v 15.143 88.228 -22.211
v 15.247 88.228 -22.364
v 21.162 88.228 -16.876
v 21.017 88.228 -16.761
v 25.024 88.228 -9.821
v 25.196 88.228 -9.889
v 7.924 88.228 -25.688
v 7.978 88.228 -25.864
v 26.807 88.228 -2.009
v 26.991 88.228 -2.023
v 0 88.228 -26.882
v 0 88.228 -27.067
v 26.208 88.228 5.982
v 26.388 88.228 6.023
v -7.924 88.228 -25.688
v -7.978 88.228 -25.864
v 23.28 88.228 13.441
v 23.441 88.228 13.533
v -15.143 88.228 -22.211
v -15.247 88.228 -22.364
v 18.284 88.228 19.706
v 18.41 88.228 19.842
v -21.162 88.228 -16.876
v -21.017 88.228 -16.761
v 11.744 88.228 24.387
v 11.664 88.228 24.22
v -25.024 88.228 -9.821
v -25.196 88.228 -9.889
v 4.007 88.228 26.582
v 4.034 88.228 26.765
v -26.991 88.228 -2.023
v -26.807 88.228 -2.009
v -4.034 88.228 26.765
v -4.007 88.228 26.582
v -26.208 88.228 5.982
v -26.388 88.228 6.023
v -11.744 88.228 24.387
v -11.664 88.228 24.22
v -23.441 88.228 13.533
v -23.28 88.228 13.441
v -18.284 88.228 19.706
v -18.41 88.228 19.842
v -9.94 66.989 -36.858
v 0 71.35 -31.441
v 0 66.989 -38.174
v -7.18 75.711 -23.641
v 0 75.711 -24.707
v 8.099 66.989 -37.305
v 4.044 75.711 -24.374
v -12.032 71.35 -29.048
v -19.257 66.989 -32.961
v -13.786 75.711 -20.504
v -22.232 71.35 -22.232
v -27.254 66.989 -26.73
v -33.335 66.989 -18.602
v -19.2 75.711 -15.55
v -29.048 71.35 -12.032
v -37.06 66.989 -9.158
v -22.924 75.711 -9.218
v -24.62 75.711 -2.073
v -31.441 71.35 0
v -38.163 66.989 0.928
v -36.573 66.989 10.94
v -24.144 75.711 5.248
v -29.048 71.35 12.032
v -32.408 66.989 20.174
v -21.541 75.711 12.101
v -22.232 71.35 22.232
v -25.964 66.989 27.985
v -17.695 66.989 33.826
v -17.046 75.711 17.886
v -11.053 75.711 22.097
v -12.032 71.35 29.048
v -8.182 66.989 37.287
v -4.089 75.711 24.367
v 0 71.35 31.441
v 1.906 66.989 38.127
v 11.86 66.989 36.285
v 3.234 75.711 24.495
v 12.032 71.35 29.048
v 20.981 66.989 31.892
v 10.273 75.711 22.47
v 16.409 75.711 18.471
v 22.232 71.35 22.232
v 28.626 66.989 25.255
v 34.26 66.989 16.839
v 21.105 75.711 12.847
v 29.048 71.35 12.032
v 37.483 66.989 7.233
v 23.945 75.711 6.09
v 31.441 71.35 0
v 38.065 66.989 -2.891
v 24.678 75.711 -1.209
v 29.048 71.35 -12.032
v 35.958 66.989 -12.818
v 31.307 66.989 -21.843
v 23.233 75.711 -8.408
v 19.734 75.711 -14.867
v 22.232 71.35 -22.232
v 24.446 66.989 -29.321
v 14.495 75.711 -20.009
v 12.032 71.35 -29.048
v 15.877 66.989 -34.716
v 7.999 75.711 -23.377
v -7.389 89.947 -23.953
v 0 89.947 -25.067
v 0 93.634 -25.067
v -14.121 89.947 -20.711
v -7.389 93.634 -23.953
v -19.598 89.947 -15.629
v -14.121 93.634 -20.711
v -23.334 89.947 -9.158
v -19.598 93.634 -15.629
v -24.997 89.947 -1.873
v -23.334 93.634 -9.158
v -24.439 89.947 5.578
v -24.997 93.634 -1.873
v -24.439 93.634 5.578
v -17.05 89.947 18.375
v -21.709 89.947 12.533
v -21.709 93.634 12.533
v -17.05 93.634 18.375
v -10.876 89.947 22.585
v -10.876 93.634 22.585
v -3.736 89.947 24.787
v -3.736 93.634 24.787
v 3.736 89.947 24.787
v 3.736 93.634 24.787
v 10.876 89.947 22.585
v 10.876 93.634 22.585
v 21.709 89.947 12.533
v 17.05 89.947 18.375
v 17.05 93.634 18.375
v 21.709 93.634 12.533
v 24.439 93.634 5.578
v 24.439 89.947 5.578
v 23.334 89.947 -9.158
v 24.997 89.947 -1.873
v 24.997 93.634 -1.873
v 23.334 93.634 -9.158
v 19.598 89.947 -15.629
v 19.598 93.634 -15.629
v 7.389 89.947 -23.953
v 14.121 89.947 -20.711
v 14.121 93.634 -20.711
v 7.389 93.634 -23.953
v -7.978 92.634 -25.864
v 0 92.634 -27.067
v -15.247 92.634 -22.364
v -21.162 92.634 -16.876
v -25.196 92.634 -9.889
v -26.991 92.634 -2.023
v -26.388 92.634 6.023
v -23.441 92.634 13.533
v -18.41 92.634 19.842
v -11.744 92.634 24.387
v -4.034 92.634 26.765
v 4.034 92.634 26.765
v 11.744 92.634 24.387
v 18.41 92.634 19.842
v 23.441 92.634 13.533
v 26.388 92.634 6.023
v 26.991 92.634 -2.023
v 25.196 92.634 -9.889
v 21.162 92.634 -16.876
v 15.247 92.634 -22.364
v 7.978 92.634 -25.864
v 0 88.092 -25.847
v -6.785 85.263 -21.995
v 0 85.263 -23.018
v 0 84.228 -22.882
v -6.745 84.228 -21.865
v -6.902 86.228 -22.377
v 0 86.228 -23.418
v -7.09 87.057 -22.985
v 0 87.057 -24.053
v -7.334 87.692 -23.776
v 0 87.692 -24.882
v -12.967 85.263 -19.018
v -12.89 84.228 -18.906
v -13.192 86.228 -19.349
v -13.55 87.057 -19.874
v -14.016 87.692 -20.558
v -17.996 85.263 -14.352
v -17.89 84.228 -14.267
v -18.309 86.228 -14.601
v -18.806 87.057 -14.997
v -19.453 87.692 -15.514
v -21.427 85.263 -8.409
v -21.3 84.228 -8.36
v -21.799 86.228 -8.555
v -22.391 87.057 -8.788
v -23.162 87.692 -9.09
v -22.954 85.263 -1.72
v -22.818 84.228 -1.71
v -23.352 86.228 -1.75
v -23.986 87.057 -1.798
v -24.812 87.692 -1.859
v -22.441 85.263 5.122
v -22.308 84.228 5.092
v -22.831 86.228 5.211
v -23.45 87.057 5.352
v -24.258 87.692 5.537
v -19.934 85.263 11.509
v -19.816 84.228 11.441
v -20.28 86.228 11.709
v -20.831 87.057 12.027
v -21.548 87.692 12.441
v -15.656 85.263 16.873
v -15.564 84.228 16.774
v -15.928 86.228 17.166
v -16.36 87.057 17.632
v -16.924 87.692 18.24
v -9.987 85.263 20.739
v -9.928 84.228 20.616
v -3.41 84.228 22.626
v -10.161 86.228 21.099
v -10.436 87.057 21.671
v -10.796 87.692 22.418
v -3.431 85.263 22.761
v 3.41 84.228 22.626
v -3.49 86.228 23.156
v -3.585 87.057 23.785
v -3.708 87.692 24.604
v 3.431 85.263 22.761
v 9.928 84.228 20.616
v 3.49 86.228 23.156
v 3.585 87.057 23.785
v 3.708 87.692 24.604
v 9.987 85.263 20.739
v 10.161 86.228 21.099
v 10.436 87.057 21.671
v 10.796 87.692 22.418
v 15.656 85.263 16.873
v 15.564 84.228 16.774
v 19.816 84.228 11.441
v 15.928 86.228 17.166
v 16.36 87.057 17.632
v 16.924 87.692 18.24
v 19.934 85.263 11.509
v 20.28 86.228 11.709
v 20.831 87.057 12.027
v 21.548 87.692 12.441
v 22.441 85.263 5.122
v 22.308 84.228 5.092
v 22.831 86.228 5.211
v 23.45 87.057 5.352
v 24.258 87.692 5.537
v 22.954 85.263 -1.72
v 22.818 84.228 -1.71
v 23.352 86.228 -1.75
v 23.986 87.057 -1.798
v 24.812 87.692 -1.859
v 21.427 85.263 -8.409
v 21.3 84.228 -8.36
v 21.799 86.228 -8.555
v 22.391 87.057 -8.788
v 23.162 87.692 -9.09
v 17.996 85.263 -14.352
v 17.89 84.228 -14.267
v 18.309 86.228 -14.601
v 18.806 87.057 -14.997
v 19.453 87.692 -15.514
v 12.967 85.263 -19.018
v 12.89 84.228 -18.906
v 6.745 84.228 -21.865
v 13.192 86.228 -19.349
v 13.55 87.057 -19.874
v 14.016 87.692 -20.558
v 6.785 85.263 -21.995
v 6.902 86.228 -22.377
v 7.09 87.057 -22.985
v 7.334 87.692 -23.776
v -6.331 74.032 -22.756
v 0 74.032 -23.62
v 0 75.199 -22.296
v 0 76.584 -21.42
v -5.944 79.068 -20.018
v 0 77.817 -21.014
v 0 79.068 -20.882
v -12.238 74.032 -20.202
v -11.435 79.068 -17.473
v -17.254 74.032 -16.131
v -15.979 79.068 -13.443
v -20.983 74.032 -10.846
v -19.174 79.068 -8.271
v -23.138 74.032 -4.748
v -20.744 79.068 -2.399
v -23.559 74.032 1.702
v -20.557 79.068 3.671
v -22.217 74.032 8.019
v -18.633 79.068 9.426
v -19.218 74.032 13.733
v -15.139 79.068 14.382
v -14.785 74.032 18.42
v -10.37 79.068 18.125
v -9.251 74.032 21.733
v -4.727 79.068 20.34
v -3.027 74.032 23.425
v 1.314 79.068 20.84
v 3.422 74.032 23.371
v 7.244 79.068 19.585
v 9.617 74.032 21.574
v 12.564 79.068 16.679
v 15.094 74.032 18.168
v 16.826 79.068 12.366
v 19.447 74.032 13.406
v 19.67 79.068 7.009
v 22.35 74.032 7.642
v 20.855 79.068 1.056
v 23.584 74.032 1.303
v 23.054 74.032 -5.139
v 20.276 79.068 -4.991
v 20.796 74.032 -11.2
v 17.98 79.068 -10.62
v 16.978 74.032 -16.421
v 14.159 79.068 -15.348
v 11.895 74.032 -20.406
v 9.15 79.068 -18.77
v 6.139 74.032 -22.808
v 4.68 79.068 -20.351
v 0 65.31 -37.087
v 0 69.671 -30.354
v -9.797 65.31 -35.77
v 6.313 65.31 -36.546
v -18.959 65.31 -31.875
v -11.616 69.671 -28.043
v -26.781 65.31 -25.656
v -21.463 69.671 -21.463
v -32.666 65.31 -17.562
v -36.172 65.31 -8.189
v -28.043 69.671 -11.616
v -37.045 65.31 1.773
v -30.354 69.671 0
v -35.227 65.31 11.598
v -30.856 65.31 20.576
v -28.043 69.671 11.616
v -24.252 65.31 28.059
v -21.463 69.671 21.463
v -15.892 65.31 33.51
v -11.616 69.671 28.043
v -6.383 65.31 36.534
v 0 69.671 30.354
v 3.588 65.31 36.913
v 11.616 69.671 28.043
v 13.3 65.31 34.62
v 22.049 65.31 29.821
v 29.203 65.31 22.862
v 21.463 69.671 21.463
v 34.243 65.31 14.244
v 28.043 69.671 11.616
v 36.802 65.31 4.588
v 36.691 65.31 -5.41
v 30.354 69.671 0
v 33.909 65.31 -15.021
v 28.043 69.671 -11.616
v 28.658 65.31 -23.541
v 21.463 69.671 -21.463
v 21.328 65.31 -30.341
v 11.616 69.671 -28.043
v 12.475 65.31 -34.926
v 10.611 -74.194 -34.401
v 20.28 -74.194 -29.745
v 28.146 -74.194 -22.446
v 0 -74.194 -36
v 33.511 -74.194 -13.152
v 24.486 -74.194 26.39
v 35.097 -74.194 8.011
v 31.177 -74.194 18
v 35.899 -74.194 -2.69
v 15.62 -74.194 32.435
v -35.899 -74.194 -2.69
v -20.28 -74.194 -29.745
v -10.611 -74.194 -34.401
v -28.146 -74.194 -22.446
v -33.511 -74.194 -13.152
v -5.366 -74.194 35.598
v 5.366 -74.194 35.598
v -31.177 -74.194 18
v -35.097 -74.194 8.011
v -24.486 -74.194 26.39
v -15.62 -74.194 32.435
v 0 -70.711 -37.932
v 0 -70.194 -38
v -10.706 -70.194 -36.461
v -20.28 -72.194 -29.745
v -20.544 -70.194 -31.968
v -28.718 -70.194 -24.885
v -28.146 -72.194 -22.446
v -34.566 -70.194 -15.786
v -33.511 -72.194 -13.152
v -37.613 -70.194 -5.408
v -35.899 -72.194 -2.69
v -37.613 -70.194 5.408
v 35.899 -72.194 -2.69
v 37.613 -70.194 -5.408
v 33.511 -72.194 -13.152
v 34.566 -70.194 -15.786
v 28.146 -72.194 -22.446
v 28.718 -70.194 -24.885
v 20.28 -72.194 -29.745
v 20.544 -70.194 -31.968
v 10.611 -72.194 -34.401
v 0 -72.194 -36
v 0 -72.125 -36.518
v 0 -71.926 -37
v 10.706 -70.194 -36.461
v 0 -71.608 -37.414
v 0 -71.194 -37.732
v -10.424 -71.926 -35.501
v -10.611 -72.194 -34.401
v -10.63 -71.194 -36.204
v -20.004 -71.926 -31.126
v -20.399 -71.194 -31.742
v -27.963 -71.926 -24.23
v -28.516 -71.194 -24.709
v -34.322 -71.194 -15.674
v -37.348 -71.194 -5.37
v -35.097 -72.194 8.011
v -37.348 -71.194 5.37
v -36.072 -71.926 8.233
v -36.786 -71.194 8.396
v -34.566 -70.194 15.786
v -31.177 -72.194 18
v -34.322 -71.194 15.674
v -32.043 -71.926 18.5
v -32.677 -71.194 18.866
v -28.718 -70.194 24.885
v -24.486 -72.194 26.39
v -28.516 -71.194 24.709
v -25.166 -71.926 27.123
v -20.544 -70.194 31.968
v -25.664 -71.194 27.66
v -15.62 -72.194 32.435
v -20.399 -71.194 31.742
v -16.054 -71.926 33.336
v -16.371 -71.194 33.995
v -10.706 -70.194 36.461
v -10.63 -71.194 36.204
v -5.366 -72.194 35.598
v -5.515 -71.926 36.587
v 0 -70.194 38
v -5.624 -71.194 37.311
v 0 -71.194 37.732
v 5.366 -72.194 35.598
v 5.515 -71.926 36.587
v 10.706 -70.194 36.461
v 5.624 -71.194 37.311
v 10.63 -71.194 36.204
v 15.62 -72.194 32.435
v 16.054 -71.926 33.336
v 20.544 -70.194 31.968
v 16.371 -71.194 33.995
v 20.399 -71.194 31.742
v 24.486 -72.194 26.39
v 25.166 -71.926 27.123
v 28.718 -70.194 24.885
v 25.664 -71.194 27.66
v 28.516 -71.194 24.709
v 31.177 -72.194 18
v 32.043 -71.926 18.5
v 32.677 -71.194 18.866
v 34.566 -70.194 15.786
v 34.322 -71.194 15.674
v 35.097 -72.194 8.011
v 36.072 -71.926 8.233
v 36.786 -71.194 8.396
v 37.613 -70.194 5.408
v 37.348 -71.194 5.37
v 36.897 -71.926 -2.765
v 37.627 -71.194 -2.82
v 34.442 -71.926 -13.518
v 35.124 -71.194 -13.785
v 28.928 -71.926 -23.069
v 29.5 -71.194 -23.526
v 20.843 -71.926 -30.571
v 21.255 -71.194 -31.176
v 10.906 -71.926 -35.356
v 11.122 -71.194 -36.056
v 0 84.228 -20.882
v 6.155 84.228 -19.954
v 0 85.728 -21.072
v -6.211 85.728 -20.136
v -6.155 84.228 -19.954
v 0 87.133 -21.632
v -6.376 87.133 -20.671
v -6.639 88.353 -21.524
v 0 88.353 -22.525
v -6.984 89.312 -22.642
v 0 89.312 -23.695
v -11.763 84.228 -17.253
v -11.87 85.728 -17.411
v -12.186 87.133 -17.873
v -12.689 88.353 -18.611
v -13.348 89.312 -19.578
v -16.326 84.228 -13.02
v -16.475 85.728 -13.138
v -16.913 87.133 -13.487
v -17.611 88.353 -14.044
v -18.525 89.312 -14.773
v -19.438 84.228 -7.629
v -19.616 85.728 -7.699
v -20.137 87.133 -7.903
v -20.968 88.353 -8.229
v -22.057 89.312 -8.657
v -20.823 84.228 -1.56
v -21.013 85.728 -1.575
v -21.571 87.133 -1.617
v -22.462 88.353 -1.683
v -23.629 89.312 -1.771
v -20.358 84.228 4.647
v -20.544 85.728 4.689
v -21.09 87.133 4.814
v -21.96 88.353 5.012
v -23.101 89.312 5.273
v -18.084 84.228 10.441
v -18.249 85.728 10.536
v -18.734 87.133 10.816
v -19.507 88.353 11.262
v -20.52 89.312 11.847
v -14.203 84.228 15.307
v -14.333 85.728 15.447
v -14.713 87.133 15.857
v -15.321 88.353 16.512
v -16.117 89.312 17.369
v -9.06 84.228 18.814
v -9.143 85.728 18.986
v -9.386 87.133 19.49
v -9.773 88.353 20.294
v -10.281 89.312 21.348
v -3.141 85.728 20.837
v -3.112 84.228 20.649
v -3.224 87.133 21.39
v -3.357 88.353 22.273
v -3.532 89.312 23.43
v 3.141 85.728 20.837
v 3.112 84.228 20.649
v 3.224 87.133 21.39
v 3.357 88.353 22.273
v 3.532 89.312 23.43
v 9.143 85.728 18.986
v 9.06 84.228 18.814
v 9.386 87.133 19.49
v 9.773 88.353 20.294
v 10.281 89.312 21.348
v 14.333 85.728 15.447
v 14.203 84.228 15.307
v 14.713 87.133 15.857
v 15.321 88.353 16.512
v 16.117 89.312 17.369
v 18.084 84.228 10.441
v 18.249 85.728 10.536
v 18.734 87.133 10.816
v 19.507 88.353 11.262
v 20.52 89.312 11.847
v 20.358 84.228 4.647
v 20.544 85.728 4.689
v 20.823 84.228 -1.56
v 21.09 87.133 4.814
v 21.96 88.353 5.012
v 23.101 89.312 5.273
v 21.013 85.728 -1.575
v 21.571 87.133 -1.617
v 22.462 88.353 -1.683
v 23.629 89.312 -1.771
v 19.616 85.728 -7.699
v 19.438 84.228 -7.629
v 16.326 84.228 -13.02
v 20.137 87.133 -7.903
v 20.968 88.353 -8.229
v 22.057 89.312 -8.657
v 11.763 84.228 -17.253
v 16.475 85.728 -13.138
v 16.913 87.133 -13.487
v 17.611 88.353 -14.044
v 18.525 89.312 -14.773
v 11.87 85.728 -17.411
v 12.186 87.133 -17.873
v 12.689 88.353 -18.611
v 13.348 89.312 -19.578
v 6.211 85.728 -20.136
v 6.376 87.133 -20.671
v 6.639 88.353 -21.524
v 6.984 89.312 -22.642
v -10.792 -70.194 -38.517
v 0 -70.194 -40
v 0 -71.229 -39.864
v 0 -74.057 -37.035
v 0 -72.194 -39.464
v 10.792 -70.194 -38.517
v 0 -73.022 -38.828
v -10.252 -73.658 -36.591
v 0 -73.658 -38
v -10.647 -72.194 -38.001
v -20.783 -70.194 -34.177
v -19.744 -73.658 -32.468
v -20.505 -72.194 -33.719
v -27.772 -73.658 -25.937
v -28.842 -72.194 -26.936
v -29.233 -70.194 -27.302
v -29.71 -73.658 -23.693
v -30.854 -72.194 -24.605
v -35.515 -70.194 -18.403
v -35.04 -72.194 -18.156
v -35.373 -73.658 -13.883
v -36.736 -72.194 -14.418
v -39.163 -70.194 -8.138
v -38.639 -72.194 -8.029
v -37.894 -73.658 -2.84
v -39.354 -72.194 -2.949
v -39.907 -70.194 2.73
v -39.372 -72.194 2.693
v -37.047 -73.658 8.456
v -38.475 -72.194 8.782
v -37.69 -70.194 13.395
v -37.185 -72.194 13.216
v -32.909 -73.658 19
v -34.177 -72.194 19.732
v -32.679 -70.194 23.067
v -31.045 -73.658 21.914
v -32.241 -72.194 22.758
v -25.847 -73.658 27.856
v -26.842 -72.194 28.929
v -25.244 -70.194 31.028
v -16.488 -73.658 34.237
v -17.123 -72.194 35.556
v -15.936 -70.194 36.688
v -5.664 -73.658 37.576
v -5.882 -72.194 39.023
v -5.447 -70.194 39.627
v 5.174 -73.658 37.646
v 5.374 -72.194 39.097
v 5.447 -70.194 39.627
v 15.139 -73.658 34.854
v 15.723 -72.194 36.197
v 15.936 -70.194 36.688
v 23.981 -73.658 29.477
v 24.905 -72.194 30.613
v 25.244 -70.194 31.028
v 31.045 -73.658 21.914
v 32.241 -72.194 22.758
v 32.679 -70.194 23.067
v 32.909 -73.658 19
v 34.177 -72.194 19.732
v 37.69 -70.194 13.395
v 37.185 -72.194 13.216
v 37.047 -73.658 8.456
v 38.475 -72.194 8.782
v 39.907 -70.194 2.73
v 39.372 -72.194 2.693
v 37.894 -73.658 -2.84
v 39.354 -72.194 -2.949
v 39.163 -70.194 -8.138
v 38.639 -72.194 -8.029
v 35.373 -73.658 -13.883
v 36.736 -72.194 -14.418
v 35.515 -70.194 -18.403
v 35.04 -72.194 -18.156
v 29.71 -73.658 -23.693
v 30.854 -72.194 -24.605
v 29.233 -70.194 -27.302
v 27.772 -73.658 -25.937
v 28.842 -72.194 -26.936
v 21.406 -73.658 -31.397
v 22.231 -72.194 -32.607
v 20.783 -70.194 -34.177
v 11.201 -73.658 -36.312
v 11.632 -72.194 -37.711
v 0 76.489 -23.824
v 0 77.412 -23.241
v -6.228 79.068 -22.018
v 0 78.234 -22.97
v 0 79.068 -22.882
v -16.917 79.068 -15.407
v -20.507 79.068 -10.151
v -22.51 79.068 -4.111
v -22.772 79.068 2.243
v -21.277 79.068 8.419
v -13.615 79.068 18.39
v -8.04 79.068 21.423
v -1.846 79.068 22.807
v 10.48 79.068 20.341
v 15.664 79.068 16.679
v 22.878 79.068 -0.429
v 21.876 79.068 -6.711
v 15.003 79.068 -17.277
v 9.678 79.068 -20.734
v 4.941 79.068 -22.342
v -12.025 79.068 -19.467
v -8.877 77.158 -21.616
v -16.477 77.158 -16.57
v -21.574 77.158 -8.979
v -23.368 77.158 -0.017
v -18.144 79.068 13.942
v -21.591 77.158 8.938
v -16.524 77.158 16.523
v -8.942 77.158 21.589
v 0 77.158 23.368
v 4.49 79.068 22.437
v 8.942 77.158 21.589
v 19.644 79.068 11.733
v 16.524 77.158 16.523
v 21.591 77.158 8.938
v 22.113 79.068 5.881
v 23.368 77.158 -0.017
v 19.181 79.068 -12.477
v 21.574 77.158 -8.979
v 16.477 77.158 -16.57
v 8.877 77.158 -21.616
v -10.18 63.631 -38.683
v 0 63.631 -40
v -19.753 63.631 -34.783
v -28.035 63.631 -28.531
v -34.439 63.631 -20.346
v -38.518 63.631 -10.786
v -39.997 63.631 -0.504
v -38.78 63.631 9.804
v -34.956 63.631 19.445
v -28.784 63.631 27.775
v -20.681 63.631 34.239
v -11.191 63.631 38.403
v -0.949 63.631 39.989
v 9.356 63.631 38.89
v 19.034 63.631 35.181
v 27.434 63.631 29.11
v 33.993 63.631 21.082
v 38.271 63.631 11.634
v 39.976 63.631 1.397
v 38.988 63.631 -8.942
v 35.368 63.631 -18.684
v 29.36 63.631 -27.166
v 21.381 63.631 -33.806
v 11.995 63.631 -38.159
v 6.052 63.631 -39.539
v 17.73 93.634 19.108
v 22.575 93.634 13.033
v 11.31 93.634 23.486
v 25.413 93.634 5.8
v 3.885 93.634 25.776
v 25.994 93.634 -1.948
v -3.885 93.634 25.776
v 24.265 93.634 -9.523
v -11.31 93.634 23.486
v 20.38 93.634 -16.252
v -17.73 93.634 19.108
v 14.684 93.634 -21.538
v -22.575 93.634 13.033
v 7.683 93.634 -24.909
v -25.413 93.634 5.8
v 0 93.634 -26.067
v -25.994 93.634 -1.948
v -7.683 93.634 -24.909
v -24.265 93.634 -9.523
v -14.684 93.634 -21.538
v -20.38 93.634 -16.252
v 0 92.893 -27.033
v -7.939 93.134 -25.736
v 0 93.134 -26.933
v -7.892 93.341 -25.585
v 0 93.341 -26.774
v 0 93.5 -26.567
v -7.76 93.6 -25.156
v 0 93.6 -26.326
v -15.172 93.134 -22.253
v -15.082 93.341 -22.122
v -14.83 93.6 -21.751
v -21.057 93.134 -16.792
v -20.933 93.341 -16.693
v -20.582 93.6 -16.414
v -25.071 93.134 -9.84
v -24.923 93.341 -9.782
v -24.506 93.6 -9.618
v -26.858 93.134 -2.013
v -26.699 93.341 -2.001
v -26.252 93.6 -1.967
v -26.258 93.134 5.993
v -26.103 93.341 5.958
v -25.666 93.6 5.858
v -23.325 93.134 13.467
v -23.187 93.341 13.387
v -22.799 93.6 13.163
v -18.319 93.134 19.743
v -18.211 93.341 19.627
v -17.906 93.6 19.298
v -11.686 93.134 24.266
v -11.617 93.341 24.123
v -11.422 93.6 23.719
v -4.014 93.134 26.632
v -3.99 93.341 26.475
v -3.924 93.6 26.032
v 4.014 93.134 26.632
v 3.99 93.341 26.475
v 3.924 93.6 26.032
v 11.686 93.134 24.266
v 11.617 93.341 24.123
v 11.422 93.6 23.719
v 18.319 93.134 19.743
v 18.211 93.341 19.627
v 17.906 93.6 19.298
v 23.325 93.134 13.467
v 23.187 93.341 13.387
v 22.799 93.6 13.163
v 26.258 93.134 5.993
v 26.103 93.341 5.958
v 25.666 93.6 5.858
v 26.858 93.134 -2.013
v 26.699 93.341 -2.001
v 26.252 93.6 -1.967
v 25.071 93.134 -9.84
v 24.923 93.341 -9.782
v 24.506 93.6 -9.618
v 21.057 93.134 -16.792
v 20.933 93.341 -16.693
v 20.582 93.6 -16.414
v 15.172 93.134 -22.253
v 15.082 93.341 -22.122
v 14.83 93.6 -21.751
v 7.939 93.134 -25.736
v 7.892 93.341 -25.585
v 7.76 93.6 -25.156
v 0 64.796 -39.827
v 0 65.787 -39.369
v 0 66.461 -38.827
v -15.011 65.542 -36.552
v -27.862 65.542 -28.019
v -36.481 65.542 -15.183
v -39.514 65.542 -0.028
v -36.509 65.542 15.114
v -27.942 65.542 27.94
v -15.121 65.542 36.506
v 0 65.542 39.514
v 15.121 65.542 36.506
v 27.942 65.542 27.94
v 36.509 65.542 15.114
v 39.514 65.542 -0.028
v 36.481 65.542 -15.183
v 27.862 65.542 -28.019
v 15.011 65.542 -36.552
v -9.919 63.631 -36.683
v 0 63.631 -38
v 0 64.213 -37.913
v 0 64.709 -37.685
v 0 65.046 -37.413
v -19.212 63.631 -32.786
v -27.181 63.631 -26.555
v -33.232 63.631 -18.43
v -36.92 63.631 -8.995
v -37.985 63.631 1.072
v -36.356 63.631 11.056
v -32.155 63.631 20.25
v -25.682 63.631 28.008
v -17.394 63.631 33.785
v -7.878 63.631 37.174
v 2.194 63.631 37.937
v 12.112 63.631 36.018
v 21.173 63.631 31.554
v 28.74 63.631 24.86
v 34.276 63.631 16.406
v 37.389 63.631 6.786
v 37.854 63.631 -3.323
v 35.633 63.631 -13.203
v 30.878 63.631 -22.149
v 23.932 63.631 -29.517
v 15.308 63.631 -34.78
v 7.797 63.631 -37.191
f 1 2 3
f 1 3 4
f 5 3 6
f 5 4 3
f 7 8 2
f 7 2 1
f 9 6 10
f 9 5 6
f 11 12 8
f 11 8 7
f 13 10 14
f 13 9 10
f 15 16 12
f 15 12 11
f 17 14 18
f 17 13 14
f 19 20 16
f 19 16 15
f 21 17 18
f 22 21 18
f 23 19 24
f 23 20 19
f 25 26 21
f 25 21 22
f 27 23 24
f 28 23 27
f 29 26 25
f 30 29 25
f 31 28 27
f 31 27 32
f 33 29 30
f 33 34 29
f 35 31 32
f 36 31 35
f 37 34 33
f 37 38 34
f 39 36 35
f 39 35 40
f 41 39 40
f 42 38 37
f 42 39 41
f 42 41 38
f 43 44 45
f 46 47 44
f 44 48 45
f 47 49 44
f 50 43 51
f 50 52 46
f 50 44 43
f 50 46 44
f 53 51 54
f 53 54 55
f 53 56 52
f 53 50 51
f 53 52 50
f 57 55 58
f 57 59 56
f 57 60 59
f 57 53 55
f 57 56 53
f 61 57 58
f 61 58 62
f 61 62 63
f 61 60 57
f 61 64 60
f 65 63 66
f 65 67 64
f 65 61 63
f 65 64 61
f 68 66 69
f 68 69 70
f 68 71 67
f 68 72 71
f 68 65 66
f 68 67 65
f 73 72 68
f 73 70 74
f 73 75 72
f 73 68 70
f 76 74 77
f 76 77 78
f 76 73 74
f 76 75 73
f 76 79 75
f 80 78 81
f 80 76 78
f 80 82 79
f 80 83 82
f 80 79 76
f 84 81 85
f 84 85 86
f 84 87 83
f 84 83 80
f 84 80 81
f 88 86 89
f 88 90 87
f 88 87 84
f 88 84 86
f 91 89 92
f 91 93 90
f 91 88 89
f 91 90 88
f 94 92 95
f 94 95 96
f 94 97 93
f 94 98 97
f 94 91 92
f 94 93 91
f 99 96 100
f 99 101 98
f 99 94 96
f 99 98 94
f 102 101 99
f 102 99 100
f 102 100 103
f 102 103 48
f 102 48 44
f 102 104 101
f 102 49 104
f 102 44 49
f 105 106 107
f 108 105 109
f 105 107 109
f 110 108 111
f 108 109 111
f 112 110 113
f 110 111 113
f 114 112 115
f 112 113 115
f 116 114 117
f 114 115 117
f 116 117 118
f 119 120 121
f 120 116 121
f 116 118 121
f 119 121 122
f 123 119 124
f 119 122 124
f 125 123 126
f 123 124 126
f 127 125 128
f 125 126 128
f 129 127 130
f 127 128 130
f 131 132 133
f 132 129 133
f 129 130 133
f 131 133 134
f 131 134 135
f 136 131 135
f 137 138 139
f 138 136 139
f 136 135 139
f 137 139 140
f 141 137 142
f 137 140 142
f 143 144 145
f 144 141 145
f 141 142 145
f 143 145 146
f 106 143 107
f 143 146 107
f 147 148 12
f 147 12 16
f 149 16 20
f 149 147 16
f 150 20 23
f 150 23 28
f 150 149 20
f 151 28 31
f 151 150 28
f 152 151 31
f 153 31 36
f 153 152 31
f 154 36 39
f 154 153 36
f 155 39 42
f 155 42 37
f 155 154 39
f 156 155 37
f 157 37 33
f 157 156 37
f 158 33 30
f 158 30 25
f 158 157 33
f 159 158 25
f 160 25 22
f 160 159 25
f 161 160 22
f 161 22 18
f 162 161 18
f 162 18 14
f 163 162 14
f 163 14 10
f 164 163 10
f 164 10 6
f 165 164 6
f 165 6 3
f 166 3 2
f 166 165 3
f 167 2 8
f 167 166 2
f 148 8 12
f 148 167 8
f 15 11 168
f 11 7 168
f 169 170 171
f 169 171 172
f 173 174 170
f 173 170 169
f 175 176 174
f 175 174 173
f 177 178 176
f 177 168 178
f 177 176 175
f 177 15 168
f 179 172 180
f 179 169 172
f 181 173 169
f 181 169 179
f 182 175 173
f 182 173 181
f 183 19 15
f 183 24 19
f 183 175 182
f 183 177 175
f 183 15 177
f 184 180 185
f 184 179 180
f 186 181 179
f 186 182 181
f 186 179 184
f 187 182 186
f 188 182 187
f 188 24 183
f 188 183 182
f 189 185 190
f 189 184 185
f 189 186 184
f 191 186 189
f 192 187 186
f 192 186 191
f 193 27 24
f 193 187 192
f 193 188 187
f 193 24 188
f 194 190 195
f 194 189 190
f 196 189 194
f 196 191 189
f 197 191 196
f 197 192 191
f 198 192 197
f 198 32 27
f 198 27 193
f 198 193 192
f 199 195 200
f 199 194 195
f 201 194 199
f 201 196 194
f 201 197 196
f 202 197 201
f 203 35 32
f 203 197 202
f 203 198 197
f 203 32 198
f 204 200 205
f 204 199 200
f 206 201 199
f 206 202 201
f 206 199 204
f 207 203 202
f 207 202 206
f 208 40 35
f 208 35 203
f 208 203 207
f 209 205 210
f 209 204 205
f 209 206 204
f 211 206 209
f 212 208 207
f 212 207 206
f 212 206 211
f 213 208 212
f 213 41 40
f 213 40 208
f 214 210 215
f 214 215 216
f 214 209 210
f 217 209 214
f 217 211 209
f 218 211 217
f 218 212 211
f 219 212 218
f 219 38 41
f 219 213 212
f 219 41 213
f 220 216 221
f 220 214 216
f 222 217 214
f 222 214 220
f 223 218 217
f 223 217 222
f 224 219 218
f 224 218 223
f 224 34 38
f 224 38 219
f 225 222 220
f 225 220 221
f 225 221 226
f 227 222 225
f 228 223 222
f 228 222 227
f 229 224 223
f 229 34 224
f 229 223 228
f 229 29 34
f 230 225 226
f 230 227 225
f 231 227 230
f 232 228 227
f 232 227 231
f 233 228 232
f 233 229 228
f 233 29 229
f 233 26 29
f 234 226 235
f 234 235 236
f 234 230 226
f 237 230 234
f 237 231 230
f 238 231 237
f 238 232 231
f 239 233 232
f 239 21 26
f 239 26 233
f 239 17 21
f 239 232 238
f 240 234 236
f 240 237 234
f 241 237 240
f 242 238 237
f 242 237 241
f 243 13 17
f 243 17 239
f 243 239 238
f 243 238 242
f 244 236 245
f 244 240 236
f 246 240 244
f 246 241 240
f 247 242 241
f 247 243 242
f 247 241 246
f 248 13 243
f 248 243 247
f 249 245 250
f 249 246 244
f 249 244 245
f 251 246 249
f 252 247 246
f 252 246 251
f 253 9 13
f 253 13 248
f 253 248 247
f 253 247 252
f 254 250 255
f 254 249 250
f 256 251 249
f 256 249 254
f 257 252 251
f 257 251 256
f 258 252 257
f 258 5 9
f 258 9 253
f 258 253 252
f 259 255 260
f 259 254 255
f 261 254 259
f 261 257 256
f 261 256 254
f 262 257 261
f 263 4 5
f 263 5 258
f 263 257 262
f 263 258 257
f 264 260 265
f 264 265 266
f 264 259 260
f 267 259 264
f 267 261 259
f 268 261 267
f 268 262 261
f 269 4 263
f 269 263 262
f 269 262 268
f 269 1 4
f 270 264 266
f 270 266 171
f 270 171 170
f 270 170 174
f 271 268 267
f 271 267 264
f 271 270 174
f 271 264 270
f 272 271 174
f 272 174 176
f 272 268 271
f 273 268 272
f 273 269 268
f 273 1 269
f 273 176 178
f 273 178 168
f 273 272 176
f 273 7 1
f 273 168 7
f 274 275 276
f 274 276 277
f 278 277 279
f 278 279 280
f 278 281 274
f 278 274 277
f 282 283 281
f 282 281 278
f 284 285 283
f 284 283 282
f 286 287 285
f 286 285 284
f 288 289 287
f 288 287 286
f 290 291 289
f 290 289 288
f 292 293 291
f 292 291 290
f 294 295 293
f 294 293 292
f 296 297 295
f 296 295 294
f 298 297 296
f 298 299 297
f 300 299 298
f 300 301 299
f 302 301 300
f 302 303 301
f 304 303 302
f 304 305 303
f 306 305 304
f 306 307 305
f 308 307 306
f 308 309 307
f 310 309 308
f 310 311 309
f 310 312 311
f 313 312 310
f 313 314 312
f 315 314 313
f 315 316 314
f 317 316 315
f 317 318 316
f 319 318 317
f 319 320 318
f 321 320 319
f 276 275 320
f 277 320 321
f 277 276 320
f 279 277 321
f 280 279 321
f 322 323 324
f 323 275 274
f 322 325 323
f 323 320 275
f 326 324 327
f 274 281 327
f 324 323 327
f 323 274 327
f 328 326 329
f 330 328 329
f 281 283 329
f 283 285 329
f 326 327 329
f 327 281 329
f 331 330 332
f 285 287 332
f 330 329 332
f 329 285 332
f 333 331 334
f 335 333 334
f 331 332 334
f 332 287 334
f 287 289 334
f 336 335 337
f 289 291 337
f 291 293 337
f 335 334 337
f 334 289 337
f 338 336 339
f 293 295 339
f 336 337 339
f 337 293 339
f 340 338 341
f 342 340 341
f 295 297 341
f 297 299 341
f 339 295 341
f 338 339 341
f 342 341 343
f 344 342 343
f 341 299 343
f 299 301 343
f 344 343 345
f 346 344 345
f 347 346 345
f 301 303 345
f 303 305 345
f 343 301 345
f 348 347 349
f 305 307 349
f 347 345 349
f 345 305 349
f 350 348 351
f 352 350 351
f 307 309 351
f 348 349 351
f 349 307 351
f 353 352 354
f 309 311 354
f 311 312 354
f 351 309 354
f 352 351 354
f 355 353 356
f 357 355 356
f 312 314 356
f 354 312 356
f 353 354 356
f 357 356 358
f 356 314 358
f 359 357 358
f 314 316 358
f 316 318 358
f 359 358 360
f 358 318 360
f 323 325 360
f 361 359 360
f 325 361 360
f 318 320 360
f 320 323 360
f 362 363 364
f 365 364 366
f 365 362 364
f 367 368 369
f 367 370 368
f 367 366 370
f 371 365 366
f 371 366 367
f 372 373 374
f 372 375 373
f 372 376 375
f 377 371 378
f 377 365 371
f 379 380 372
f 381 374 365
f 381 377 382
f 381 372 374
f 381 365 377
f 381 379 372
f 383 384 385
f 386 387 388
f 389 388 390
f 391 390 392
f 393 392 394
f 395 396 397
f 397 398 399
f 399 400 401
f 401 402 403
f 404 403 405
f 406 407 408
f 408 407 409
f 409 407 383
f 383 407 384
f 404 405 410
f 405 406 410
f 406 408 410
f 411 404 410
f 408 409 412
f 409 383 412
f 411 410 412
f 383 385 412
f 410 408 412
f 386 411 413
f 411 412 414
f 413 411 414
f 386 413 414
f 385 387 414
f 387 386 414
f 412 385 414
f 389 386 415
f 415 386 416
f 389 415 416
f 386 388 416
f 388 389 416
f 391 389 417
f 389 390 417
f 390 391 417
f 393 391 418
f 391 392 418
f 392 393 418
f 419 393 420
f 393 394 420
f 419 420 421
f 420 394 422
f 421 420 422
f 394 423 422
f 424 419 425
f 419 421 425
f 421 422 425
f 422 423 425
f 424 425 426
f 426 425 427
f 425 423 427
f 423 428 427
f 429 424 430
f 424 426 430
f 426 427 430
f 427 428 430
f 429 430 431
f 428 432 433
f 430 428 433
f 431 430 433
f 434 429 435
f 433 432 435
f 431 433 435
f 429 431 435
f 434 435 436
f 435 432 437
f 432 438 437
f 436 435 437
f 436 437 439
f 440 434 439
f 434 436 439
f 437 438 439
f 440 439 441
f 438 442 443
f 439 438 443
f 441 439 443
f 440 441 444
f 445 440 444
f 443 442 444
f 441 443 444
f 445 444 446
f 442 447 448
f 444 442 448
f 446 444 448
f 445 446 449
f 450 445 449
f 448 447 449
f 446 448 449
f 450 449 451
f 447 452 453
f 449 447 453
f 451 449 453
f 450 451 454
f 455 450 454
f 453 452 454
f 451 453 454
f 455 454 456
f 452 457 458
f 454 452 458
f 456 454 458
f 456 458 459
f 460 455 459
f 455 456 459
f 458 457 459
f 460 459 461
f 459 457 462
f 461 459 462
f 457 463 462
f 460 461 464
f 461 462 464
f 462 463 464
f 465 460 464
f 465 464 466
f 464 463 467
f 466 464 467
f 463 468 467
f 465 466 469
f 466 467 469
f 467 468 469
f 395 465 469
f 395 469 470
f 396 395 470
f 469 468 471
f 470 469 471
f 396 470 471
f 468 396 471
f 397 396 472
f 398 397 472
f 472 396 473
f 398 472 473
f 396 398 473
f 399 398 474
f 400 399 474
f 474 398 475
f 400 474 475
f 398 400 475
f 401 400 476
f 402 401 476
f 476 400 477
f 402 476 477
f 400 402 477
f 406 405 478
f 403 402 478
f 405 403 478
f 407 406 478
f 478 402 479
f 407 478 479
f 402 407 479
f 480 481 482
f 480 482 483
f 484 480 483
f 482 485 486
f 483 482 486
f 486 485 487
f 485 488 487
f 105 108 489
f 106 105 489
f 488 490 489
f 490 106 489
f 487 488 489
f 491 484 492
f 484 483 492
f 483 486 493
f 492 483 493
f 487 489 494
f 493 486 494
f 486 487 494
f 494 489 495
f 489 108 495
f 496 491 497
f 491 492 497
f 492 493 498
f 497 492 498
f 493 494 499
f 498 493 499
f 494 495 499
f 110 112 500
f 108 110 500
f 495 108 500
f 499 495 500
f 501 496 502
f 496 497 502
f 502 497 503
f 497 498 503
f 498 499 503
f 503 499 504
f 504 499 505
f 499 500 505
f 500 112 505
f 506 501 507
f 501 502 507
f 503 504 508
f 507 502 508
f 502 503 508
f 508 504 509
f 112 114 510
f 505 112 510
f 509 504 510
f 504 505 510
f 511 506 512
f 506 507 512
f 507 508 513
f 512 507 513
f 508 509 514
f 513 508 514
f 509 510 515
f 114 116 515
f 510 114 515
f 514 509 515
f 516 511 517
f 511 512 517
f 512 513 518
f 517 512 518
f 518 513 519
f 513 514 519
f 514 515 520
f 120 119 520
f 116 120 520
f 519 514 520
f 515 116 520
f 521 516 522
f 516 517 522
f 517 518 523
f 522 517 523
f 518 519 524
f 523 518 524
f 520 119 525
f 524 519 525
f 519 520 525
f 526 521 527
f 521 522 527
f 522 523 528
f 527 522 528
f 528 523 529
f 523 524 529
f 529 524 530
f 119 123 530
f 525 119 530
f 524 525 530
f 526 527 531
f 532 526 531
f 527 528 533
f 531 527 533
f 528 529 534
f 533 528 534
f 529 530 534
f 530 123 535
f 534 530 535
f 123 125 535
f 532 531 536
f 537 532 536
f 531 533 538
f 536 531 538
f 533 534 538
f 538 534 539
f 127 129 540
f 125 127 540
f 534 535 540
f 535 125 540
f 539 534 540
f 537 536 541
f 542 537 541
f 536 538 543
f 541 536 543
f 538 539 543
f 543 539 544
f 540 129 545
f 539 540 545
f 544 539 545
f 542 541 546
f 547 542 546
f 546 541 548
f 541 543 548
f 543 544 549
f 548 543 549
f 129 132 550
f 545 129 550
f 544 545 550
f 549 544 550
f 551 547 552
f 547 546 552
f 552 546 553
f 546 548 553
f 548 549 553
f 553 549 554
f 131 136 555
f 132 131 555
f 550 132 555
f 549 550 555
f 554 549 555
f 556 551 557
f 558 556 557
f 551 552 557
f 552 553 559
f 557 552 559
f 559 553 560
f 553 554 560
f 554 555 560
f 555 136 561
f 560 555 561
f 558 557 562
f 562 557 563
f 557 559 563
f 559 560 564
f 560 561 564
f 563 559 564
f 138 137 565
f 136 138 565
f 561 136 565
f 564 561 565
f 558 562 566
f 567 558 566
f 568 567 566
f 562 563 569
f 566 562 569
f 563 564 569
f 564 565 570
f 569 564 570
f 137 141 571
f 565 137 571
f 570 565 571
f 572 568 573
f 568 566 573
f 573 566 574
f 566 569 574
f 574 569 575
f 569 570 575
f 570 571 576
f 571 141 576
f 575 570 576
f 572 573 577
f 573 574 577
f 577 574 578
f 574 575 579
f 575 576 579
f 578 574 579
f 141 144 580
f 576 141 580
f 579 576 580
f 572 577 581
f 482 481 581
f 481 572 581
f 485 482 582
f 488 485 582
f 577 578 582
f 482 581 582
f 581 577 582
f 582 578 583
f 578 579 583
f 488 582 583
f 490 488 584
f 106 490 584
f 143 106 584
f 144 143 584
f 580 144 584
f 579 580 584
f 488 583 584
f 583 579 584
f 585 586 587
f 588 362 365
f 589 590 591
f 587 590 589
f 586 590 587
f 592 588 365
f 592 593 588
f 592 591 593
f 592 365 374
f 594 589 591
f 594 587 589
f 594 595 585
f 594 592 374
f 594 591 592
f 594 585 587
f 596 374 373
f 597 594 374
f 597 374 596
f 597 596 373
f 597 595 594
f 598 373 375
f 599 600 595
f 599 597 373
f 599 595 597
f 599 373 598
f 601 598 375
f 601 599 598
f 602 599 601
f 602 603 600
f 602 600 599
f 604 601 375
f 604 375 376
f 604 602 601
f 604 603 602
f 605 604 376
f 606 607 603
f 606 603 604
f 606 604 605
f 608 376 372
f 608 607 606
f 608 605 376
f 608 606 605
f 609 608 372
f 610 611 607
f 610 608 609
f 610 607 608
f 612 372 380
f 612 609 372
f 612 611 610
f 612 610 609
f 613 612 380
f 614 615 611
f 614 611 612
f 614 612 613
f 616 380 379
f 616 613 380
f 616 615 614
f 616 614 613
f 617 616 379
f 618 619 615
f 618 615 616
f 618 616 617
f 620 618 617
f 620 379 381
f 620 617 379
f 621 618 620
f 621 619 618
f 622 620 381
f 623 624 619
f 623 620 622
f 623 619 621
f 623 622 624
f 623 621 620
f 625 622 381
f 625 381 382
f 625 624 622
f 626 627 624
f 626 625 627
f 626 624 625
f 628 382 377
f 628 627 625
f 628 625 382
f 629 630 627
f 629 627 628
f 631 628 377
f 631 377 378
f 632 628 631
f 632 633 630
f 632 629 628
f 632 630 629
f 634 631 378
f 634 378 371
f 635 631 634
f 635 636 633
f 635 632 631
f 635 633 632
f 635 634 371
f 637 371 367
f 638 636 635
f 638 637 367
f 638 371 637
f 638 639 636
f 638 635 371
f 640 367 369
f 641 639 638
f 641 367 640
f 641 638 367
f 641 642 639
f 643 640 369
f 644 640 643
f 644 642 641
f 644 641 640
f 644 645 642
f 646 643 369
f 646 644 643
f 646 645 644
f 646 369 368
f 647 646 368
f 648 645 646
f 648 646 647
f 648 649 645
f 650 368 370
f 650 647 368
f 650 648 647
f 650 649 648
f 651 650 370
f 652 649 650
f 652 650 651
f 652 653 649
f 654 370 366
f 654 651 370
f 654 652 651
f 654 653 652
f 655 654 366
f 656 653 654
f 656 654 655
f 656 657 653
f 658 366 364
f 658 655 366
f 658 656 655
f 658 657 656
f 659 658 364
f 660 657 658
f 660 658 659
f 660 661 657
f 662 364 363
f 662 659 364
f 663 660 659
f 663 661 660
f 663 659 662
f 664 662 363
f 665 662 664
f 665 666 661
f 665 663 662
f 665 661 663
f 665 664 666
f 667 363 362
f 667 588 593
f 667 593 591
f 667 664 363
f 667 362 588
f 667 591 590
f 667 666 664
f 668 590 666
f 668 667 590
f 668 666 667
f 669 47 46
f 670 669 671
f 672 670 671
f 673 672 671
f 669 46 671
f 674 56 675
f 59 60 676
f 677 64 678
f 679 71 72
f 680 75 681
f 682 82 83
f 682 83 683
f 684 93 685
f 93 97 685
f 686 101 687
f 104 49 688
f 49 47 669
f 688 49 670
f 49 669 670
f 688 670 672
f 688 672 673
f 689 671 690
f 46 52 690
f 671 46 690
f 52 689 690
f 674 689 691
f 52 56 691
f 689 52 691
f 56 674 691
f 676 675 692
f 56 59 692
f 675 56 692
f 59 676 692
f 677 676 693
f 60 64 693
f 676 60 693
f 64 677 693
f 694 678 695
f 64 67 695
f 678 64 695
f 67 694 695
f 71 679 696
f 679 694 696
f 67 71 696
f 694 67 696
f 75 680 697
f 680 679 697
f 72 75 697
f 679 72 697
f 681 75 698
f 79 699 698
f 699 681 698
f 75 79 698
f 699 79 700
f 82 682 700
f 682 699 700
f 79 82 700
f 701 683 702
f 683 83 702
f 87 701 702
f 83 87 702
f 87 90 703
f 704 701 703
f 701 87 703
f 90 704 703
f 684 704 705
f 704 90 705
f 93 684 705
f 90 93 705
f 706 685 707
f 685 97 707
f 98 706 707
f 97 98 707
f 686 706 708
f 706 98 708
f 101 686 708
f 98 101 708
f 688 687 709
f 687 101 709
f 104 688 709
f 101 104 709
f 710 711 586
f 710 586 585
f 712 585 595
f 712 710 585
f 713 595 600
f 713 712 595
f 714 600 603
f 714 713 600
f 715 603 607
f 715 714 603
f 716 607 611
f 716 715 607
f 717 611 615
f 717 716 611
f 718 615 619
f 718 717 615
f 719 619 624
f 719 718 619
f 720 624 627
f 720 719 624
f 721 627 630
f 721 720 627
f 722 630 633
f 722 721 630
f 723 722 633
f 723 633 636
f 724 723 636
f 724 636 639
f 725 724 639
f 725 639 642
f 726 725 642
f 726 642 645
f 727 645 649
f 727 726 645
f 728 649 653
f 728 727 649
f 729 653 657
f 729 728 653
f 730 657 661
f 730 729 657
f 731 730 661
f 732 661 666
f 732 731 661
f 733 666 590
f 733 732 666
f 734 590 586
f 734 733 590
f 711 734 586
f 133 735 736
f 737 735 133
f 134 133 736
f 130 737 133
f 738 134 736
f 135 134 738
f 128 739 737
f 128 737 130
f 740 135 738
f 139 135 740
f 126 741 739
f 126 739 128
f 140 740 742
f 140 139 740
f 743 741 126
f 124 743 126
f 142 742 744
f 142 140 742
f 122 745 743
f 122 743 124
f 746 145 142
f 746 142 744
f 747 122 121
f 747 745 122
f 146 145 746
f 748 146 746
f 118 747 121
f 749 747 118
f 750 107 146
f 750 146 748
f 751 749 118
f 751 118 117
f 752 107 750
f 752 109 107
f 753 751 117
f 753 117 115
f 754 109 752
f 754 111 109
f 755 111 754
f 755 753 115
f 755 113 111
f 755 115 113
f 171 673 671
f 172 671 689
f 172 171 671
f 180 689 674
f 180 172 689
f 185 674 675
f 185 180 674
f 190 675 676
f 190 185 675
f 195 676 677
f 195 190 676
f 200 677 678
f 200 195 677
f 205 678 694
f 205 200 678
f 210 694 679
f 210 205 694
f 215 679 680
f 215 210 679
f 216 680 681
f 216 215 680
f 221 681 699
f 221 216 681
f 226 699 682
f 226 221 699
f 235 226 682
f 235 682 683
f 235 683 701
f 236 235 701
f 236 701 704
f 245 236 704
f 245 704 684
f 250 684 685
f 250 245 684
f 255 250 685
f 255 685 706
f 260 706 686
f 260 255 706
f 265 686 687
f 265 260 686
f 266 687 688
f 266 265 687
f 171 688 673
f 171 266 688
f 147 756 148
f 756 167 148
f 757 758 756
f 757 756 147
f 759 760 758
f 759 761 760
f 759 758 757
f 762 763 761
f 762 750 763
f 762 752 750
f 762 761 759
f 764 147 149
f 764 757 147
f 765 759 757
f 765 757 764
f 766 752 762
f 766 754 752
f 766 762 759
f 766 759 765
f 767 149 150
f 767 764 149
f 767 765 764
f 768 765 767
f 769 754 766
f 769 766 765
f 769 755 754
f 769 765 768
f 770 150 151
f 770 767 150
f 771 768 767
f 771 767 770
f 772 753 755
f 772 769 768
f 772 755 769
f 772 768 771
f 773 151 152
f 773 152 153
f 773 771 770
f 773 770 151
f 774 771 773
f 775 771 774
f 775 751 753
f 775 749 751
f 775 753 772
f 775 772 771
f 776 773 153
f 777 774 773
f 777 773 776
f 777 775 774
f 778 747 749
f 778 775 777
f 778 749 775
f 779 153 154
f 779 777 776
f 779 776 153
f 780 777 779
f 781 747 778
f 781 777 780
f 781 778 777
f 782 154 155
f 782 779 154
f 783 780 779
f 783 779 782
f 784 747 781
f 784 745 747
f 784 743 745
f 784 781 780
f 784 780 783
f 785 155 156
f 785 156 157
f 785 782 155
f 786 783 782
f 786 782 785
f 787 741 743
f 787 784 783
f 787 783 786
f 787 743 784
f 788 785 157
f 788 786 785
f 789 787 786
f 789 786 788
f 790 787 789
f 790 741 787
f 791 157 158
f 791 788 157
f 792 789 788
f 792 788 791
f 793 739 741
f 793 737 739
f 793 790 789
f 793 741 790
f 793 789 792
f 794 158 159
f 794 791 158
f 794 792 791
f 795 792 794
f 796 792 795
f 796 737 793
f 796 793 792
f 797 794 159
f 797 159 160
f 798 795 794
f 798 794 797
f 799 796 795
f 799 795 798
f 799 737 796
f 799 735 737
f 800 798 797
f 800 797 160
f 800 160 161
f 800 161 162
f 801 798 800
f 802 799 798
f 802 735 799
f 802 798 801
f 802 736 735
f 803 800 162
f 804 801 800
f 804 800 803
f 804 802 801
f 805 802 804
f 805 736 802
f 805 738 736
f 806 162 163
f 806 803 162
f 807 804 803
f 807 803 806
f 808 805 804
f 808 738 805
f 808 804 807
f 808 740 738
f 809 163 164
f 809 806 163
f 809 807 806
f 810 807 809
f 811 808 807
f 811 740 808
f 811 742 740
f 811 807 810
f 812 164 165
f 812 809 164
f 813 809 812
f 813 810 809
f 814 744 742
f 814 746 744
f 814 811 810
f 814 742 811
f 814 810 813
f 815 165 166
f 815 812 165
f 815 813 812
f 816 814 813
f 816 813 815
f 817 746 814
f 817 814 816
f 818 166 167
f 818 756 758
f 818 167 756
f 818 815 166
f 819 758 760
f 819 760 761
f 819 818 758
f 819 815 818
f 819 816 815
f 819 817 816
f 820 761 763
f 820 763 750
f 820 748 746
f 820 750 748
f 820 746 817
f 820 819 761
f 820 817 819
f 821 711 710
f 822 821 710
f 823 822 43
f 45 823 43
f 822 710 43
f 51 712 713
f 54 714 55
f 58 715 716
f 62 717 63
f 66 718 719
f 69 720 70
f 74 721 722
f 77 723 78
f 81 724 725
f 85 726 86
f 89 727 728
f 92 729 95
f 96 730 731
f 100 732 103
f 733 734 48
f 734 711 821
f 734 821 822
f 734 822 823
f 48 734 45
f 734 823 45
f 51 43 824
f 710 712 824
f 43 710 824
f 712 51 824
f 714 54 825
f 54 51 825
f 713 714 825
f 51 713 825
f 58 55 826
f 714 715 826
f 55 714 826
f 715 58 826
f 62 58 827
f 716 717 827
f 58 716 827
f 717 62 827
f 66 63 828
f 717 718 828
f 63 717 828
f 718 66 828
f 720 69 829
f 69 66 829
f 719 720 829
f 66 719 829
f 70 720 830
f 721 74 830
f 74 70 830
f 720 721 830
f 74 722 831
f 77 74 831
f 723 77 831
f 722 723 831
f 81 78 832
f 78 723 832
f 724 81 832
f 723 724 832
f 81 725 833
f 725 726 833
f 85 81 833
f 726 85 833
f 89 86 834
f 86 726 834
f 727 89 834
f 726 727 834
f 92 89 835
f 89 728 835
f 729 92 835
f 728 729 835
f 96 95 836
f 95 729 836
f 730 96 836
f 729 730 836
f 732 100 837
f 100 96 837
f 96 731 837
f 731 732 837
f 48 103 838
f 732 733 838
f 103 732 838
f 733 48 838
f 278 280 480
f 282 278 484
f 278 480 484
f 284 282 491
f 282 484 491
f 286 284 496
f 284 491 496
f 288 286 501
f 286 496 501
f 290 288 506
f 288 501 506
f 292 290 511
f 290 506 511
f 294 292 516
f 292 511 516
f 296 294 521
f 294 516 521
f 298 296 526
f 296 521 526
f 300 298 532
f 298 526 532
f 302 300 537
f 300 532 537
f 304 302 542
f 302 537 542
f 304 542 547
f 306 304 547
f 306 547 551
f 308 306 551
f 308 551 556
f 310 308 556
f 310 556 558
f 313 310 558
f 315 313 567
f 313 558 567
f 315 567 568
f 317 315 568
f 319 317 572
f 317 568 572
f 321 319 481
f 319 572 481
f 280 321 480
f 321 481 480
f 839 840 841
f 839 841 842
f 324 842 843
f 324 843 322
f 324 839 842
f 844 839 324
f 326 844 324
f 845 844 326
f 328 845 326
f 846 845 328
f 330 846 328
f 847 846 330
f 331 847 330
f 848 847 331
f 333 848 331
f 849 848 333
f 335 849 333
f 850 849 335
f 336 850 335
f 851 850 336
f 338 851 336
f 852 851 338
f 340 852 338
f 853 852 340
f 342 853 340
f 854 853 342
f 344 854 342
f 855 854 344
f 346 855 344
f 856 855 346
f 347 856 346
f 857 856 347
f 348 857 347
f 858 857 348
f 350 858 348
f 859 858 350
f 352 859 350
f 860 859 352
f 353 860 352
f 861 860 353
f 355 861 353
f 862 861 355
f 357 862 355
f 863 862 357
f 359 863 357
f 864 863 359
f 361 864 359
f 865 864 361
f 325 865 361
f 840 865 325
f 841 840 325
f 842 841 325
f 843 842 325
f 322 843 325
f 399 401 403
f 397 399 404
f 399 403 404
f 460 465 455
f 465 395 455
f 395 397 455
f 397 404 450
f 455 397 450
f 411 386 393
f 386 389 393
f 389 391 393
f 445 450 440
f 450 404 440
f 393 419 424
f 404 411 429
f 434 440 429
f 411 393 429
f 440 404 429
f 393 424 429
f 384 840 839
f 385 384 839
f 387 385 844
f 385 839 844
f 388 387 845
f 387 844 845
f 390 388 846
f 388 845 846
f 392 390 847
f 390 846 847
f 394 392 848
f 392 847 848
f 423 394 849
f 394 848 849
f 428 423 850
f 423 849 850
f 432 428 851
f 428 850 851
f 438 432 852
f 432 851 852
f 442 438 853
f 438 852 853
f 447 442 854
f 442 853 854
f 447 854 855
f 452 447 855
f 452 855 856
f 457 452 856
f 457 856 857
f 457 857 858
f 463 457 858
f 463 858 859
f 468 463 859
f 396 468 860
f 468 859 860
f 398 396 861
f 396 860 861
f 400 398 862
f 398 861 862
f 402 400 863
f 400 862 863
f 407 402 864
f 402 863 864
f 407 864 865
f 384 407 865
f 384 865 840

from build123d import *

# Parameters (mm, degrees)
FILLET1_R = 4
FILLET2_R = 1
SHELL1_T  = 2


with BuildPart() as part:
    # Sketch5 → Revolve1 (revolve)
    with BuildSketch(Plane.XY, mode=Mode.PRIVATE) as revolve1_sk:
        Polygon((0, -74.193548387), (40, -74.193548387), (40, 65.806451613), (22.881800616, 76.893293207), (22.881800616, 88.228166712), (27.066984679, 88.228166712), (27.066984679, 93.634029461), (0, 93.634029461), align=None)
    revolve(revolve1_sk.sketch.rotate(Axis((0, -74.193548387, 0), (0, 1, 0)), 90), axis=Axis((0, -74.193548387, 0), (0, 1, 0)))

    # Fillet1
    fillet1_edges = [part.edges().sort_by_distance(p)[0] for p in [
        (0, 65.806451613, 40),
        (0, -74.193548387, 40),
        (0, 88.228166712, 22.881800616),
        (0, 76.893293207, 22.881800616),
    ]]
    fillet(fillet1_edges, radius=FILLET1_R)

    # Fillet2
    fillet2_edges = [part.edges().sort_by_distance(p)[0] for p in [
        (0, 93.634029461, 27.066984679),
    ]]
    fillet(fillet2_edges, radius=FILLET2_R)

    # Shell1
    # the kernel refuses this shell: the inside is offset whole and opened at the faces by hand
    shell1_offset = offset(amount=-SHELL1_T, mode=Mode.PRIVATE)
    shell1_offset = shell1_offset + extrude(shell1_offset.faces().sort_by_distance((0, 91.634029, 0))[0], amount=SHELL1_T, mode=Mode.PRIVATE)
    add(shell1_offset, mode=Mode.SUBTRACT)


solid = part.part
